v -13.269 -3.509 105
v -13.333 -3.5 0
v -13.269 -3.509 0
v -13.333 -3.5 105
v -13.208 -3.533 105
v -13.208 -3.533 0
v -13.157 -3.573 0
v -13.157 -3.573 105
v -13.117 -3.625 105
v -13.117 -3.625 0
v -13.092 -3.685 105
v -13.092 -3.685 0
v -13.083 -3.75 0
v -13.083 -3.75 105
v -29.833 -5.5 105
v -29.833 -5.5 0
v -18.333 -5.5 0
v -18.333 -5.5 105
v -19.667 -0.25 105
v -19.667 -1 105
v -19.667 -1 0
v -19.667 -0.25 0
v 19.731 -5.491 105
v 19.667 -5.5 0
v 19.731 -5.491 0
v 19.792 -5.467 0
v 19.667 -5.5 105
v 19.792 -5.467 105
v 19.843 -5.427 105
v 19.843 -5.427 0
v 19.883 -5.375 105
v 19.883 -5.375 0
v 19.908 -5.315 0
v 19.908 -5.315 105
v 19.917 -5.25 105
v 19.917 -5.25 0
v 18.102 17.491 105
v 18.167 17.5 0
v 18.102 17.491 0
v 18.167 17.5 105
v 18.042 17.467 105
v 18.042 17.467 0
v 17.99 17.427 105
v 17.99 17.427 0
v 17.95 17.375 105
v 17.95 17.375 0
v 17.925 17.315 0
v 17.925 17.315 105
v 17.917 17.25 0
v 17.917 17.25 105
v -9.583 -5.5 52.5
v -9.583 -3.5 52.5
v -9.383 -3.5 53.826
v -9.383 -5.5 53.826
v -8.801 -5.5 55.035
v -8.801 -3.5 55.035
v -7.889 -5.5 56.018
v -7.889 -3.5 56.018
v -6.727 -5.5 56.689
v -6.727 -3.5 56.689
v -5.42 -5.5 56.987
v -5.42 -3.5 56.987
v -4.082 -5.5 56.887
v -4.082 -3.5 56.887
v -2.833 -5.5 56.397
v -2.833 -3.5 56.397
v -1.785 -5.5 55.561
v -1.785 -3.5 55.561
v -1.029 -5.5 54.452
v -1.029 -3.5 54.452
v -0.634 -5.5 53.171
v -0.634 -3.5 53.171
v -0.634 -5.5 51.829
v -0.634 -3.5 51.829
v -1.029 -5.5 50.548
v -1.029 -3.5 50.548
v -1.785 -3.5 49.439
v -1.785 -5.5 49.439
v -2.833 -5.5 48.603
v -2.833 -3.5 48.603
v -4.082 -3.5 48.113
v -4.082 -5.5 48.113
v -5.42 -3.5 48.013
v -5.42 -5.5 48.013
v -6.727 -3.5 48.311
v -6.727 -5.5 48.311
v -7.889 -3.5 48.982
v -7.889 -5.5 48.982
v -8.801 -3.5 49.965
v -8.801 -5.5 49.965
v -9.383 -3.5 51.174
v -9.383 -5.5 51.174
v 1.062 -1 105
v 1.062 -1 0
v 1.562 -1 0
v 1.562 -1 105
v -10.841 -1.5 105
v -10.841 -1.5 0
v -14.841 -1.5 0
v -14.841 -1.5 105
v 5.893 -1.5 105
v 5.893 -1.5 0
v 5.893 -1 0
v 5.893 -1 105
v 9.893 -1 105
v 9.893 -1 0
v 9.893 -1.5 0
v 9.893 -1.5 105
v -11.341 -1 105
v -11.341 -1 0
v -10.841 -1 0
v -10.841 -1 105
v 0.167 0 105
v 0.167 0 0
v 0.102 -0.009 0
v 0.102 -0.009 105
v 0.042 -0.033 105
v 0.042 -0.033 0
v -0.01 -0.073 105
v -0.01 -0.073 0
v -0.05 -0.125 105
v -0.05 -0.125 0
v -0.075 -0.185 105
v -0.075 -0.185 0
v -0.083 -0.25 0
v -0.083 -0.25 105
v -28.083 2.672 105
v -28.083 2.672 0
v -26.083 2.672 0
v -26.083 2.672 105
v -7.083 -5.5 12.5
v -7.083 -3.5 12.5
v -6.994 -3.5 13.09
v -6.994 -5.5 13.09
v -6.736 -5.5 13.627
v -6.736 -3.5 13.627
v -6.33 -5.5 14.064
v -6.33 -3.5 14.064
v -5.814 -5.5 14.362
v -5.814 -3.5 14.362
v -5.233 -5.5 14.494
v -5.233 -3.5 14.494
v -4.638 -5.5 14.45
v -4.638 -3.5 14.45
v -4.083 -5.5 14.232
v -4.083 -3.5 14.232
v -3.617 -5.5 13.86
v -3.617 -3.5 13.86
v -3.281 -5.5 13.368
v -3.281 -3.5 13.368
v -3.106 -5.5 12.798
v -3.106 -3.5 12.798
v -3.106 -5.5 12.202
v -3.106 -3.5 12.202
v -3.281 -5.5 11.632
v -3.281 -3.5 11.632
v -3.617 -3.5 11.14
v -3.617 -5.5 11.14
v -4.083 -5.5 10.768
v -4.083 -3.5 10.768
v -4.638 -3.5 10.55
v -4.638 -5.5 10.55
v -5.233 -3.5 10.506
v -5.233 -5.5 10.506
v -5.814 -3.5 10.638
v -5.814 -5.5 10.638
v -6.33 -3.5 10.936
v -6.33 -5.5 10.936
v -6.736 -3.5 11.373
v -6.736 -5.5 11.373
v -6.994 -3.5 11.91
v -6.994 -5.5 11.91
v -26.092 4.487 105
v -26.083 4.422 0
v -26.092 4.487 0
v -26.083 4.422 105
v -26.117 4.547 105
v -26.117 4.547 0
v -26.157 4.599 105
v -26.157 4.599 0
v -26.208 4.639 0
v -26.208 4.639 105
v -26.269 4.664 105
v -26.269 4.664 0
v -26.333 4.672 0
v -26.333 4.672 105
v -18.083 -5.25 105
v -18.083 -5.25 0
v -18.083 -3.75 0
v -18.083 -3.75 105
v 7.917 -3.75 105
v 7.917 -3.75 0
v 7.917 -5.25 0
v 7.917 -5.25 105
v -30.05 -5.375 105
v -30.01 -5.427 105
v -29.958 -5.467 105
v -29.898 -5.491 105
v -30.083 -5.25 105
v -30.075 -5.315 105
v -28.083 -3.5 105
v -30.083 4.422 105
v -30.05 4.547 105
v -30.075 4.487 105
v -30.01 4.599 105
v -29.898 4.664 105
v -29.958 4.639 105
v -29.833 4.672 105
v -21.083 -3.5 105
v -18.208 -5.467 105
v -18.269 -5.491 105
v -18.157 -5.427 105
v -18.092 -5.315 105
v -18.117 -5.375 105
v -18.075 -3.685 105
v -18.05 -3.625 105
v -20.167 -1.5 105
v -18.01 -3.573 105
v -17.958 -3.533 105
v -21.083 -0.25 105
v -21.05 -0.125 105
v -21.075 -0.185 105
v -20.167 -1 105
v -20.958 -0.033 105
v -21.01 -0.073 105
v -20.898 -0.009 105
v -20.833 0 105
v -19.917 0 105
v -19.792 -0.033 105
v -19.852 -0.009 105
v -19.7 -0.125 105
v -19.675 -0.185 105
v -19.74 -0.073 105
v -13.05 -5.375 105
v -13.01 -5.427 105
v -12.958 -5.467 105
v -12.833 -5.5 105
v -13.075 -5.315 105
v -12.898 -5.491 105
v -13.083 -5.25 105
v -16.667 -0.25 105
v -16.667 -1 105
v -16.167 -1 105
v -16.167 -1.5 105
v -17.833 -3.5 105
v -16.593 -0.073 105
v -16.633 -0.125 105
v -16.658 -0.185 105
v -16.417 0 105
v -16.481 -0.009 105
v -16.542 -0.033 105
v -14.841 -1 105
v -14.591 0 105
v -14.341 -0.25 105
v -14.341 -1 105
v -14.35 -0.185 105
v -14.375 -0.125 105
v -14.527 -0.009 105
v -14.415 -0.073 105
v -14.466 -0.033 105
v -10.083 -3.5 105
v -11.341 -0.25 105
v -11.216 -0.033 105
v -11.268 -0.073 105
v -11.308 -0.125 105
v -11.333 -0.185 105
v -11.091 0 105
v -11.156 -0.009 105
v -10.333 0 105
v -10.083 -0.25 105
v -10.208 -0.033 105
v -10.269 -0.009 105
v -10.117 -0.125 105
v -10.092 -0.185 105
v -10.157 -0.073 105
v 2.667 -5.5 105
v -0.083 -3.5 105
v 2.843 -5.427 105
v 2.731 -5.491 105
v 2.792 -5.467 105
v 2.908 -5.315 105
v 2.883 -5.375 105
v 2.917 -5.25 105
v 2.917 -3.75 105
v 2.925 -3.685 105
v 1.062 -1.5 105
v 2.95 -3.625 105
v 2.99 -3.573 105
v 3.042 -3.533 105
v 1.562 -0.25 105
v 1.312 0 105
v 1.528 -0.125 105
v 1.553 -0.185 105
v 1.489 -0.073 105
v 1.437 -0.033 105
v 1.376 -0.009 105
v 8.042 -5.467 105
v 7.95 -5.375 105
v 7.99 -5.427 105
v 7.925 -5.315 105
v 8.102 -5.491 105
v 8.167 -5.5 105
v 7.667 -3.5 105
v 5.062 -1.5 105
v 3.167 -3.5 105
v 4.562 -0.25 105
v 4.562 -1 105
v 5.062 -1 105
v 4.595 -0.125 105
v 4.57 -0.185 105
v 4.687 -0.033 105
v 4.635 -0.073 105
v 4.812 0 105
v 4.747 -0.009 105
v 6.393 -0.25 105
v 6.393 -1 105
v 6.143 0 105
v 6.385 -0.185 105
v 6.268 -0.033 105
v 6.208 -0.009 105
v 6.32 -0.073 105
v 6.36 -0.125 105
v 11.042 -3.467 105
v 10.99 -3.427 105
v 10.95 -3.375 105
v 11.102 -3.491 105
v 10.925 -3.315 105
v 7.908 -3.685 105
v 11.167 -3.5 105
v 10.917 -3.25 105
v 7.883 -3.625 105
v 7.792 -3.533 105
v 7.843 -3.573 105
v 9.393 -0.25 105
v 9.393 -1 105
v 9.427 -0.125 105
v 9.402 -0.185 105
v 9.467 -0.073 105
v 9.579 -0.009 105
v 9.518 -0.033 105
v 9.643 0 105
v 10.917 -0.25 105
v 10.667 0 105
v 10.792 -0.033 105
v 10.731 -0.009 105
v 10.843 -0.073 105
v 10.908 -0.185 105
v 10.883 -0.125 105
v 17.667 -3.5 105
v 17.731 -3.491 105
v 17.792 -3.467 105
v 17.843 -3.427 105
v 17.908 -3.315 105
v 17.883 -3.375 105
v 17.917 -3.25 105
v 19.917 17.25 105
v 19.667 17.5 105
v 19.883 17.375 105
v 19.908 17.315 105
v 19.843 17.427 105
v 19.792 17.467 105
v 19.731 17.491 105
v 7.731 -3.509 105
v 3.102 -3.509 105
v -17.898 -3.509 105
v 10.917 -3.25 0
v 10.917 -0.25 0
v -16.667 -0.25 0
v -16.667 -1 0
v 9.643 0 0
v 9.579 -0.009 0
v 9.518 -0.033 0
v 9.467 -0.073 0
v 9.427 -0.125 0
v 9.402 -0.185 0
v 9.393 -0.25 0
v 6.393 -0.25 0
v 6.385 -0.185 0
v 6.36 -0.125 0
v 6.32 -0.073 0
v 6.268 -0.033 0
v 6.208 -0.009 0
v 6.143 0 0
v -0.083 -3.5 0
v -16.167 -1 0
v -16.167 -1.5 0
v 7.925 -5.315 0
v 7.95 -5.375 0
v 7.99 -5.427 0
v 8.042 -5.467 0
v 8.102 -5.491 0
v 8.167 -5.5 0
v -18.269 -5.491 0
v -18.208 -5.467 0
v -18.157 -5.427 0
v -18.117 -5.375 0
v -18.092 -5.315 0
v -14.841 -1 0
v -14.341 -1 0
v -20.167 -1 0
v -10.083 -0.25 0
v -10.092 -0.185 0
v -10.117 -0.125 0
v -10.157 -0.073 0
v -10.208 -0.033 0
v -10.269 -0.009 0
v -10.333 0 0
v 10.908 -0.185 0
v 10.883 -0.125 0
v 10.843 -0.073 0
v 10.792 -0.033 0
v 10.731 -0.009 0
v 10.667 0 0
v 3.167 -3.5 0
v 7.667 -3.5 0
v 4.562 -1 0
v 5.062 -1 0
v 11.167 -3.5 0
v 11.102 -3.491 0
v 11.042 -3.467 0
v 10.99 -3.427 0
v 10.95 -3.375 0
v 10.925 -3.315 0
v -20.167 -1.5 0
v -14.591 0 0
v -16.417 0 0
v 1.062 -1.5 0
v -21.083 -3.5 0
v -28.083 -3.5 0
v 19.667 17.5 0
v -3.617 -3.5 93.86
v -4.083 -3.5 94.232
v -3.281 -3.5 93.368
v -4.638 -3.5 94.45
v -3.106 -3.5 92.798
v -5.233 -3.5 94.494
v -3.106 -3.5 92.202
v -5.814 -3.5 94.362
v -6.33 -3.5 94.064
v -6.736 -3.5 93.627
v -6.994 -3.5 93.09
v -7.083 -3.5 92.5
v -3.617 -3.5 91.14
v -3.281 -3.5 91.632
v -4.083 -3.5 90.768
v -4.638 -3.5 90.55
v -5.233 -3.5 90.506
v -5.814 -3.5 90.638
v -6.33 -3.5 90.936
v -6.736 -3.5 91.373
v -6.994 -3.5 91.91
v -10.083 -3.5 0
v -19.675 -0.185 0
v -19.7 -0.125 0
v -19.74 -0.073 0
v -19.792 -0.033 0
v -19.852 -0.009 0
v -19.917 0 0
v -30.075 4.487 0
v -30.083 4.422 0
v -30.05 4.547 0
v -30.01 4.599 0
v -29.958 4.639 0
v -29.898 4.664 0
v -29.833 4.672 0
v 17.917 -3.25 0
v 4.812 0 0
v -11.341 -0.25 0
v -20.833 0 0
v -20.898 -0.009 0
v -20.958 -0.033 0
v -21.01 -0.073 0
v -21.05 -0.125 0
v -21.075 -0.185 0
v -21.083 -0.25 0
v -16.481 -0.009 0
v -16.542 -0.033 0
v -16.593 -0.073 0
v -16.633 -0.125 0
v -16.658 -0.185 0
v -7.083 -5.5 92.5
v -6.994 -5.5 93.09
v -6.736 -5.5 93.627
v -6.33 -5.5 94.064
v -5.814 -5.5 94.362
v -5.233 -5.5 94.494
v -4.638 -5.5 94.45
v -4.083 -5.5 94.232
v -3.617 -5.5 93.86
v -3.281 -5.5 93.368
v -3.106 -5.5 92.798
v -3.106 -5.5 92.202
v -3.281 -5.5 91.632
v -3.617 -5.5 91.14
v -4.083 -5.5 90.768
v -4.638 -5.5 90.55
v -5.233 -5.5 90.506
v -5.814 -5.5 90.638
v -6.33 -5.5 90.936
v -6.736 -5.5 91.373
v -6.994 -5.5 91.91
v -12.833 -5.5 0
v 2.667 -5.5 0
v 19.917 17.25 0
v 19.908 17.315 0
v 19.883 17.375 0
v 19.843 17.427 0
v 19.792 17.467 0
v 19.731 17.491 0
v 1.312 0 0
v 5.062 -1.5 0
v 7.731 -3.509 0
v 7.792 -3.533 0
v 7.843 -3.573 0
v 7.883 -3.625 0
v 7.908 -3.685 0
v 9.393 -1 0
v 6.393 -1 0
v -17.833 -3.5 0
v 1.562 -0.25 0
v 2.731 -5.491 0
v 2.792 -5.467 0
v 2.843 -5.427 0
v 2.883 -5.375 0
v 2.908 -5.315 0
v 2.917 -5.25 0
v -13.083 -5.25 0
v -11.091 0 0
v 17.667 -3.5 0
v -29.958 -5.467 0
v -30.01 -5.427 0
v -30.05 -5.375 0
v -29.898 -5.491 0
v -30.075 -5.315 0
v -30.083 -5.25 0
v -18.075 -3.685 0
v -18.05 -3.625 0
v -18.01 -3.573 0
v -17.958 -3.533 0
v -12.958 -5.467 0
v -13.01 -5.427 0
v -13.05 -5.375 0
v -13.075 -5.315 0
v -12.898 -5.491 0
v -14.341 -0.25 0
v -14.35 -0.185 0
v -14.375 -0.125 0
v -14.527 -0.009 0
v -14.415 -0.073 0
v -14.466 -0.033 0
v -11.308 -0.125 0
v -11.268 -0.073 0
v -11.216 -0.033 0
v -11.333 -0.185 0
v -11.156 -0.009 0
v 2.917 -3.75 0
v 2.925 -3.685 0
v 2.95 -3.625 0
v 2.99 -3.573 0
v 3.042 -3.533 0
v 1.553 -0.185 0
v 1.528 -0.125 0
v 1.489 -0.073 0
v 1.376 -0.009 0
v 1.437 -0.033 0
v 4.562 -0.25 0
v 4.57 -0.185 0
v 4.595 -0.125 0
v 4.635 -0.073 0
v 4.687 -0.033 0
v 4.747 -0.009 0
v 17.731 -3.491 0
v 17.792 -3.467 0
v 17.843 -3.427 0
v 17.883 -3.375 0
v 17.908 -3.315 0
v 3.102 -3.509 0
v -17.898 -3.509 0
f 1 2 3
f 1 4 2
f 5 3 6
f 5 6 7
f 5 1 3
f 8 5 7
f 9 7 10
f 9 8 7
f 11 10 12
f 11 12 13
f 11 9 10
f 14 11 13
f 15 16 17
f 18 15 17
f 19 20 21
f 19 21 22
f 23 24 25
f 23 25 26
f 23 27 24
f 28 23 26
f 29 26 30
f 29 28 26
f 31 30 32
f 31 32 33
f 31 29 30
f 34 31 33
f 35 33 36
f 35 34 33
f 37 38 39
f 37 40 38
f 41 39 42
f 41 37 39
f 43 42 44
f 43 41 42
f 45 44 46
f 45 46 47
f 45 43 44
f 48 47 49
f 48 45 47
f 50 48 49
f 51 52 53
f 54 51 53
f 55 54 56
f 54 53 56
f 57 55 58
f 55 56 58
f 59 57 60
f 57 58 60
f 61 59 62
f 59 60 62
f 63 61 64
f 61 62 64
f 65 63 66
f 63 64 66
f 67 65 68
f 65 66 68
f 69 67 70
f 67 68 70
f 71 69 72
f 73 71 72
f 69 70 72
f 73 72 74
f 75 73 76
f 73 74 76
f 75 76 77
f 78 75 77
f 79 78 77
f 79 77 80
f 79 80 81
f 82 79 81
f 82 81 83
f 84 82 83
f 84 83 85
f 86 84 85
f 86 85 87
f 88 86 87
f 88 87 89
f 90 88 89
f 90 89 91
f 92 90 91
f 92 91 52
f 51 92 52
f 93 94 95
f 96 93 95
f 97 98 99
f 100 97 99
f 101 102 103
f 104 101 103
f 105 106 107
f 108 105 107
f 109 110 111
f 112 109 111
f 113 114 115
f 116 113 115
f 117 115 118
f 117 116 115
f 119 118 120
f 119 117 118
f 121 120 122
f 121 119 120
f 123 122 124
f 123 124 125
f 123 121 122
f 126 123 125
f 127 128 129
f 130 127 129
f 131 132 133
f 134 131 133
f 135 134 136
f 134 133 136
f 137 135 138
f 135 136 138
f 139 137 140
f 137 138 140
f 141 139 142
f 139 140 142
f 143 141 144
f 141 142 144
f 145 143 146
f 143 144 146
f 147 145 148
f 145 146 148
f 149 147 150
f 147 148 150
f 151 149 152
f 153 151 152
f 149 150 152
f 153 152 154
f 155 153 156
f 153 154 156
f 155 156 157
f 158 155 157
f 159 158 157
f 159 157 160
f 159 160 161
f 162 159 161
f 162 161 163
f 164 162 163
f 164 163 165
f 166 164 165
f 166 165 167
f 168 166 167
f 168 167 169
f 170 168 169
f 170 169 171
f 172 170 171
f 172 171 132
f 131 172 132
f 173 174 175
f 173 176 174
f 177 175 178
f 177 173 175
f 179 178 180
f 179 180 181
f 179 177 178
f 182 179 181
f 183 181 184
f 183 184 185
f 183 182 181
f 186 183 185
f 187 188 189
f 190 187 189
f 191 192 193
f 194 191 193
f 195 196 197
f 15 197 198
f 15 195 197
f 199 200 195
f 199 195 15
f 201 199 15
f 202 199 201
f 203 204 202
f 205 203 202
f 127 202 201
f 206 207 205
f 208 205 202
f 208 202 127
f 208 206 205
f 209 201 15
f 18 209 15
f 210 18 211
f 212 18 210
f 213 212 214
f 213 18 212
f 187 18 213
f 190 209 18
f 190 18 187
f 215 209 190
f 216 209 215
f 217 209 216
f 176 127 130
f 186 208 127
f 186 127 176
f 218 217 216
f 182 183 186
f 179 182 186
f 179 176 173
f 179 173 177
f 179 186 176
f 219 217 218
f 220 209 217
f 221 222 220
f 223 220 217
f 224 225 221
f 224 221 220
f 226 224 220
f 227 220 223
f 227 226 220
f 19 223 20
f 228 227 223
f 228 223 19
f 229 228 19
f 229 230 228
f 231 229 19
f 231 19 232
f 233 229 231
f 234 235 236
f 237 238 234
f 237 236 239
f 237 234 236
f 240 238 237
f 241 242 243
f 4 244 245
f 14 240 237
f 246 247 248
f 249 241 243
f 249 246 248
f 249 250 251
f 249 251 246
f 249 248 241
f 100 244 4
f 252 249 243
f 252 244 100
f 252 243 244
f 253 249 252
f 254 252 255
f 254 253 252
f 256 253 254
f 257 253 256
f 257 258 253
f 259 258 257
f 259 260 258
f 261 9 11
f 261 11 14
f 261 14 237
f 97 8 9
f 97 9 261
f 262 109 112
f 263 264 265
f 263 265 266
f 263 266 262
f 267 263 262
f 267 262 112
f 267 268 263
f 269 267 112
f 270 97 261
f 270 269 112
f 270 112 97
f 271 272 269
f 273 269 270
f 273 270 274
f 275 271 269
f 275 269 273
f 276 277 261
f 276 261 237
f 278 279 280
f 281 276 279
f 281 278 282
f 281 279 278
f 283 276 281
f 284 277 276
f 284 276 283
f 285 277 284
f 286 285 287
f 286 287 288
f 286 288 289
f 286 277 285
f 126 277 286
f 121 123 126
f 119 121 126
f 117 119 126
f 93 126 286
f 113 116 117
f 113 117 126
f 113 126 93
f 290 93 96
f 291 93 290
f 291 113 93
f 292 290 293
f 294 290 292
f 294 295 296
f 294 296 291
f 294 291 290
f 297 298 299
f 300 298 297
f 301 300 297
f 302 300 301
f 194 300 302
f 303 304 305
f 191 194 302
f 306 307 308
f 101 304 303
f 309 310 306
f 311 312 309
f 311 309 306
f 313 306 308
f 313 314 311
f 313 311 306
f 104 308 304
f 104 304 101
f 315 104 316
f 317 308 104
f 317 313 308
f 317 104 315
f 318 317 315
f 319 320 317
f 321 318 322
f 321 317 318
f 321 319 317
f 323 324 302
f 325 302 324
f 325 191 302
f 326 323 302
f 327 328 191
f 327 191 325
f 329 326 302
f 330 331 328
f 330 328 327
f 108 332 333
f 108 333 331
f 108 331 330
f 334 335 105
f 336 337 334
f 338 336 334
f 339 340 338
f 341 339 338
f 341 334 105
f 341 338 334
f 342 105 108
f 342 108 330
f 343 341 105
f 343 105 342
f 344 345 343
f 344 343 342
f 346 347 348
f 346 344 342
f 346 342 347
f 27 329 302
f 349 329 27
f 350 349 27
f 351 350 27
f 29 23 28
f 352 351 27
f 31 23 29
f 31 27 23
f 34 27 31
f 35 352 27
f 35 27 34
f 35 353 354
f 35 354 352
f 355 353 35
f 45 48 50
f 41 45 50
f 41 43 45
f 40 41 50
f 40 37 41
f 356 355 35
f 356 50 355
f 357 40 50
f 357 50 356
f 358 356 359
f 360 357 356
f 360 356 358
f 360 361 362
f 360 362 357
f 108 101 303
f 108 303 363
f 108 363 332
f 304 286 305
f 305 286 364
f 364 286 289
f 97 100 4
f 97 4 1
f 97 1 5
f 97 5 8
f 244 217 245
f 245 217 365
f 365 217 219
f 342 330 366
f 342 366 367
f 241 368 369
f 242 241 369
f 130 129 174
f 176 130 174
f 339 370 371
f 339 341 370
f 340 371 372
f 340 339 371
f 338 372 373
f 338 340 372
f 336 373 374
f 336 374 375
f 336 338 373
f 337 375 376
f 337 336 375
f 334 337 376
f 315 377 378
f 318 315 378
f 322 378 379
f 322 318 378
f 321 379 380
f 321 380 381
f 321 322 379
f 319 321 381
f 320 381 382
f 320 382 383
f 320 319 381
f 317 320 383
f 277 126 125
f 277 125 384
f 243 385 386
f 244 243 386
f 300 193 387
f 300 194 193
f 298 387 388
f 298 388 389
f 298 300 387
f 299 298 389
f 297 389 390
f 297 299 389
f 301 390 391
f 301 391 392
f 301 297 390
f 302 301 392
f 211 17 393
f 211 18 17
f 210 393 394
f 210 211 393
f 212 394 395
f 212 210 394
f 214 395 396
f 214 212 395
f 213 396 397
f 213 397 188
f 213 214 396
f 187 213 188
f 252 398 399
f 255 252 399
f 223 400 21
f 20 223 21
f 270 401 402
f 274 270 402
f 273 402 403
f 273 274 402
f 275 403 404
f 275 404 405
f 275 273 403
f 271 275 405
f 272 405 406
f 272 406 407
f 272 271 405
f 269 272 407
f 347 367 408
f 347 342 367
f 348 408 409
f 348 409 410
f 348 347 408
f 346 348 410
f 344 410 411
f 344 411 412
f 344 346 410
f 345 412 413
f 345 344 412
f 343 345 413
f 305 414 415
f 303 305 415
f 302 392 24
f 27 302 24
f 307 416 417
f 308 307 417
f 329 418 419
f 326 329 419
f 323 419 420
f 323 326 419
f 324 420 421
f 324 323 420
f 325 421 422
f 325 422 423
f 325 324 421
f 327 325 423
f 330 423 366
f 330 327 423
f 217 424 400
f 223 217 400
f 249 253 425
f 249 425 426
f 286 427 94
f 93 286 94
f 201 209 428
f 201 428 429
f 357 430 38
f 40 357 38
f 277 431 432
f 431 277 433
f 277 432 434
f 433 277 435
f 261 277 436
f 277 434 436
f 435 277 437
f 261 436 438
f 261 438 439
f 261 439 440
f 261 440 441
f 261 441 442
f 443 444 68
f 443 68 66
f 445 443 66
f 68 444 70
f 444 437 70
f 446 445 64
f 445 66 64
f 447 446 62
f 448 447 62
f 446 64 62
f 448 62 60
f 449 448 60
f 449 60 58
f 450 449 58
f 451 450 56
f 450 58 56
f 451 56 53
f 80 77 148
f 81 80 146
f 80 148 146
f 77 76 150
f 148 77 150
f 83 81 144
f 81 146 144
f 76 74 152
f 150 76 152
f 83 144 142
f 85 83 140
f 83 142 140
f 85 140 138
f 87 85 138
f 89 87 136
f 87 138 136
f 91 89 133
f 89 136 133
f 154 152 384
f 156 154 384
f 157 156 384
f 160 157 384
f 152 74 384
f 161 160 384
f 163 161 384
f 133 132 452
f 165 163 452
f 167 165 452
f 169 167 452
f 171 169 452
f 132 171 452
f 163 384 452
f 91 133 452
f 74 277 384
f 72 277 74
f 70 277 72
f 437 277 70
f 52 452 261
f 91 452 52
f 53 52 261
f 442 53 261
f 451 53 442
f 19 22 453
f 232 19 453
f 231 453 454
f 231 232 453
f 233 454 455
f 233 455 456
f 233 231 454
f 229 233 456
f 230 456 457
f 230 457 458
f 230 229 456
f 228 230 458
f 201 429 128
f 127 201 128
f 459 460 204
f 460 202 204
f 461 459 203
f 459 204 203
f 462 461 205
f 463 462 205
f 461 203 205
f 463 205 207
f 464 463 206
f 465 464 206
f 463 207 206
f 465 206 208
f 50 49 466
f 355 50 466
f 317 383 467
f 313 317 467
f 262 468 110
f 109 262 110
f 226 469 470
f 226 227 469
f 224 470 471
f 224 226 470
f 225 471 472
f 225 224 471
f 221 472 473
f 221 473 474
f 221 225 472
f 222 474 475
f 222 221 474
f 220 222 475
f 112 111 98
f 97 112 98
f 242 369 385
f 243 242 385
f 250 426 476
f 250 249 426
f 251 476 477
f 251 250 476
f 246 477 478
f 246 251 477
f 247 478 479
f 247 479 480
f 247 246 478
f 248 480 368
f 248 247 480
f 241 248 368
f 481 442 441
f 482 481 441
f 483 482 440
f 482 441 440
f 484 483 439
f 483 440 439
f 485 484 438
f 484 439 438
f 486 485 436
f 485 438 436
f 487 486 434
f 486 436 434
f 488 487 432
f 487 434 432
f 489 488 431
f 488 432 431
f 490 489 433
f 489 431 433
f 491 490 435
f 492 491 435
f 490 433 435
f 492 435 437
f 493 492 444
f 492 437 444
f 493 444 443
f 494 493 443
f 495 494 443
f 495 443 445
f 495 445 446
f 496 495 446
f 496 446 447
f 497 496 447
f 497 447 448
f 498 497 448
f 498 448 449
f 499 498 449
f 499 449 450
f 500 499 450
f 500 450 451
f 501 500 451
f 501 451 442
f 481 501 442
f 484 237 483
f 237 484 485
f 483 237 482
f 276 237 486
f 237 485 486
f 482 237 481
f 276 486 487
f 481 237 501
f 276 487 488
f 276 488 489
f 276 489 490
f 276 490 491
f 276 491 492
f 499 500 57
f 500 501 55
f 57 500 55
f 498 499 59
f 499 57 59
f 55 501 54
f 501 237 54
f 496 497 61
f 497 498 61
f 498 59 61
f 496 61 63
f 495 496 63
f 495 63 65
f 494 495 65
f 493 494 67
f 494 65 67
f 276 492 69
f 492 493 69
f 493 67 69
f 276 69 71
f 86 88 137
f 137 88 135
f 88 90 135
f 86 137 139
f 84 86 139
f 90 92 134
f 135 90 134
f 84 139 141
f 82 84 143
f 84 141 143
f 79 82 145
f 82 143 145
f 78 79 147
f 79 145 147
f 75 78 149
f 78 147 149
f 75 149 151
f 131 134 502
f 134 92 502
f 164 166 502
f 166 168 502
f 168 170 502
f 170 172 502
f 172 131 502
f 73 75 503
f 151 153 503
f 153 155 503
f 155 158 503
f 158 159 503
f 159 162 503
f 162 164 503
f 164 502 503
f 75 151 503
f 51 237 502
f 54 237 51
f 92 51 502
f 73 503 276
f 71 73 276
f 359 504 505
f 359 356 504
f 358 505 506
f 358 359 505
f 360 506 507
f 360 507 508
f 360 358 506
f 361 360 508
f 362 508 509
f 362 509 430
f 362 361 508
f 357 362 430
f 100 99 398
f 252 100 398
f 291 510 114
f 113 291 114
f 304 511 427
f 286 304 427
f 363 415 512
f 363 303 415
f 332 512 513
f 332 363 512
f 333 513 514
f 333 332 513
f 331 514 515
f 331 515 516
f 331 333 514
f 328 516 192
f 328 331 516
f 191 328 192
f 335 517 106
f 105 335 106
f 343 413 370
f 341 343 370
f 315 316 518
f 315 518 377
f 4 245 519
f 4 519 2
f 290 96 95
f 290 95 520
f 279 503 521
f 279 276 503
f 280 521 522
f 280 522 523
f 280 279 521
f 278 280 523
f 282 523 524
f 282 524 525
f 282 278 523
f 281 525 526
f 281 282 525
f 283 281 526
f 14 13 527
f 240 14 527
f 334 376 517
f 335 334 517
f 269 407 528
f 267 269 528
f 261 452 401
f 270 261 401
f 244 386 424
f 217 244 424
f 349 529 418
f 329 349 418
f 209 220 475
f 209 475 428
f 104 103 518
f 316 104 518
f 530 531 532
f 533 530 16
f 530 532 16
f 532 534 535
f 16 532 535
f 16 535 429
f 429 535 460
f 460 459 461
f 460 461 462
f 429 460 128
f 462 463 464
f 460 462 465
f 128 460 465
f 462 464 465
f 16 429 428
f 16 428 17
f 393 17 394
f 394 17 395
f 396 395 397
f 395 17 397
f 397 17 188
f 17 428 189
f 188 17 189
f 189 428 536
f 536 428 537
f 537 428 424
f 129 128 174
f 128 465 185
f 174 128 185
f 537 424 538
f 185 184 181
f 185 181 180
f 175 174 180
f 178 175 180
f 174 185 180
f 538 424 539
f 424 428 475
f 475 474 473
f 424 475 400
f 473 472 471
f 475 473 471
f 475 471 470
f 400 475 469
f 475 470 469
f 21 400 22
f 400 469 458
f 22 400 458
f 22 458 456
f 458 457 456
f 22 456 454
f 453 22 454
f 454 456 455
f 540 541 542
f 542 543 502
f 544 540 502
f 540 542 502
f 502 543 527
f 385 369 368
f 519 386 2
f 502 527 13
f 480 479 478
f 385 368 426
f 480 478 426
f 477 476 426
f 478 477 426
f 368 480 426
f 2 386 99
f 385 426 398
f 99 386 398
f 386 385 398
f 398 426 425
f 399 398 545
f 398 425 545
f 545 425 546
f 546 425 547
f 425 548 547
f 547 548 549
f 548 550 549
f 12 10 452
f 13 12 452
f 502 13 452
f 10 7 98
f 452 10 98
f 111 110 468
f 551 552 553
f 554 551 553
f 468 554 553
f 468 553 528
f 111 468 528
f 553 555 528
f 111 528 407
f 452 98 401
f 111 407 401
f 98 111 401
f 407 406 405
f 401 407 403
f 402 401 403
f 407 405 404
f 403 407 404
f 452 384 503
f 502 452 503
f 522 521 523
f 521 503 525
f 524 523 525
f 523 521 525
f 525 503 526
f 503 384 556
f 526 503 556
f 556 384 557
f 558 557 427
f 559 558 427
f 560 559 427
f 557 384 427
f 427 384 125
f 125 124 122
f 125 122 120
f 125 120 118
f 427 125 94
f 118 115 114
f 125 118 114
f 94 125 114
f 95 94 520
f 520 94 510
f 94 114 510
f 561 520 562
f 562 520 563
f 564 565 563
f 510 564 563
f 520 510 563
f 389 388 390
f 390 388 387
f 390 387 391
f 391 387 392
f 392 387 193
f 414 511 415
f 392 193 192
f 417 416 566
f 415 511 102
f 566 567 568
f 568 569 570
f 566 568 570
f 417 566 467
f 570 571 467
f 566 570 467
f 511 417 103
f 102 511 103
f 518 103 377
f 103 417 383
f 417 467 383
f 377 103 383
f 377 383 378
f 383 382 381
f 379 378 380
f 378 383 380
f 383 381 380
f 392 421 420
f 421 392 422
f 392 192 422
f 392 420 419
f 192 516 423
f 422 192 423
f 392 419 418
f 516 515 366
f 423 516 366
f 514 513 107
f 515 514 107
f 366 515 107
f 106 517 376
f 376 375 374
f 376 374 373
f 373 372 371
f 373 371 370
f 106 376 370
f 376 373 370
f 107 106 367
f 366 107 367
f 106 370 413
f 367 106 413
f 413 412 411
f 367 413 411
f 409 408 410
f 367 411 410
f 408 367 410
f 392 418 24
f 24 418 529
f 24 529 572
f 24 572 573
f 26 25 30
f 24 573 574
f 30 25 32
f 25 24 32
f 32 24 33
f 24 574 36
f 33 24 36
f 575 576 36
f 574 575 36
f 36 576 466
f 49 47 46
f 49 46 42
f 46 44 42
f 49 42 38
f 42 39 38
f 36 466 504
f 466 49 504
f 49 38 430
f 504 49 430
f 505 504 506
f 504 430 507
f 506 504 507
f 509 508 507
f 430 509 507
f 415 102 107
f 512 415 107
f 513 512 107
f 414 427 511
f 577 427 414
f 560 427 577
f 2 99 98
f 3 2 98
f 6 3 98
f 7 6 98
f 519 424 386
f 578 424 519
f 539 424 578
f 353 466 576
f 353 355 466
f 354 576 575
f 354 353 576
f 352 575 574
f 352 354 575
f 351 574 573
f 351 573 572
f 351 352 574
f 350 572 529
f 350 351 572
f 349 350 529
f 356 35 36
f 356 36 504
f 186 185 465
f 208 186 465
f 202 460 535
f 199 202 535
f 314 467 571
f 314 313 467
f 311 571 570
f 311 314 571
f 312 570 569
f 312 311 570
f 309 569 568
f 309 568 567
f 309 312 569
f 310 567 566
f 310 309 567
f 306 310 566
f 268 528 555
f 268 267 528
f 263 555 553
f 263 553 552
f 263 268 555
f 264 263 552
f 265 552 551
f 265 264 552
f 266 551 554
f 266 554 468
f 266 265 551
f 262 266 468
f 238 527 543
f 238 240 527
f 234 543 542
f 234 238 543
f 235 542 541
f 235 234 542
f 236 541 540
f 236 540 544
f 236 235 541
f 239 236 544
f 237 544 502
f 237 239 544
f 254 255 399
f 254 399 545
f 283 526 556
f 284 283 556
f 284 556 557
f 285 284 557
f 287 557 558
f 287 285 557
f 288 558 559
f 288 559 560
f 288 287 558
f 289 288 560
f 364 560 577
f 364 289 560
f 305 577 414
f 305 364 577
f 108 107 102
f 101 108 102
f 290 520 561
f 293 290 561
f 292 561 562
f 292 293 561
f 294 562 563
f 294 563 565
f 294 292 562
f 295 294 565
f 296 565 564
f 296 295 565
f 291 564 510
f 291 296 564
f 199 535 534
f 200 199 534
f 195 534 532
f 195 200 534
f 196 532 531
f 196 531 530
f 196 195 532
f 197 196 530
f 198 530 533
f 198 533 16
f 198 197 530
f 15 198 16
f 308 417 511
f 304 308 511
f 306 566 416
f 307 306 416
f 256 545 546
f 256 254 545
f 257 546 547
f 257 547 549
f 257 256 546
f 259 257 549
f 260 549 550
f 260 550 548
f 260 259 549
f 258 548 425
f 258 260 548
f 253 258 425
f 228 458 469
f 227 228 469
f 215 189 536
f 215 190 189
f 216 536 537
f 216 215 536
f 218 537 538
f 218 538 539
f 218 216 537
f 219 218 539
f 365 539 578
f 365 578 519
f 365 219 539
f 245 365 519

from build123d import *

# Parameters (mm, degrees)
F1_DEPTH = 105
F2_R     = 0.25
F3_R     = 2
F3_R_2   = 4.5
F4_DEPTH = 25


with BuildPart() as f1:
    # F0 (on Top) → F1 (new body)
    with BuildSketch(Plane.XY):
        Polygon((-30.083321, 4.672126), (-30.083321, -5.5), (-18.083321, -5.5), (-18.083321, -3.5), (-13.083321, -3.5), (-13.083321, -5.5), (2.916679, -5.5), (2.916679, -3.5), (7.916679, -3.5), (7.916679, -5.5), (19.916679, -5.5), (19.916679, 17.5), (17.916679, 17.5), (17.916679, -3.5), (10.916679, -3.5), (10.916679, 0), (9.393476, 0), (9.393476, -1), (9.893476, -1), (9.893476, -1.5), (5.893476, -1.5), (5.893476, -1), (6.393476, -1), (6.393476, 0), (4.561732, 0), (4.561732, -1), (5.061732, -1), (5.061732, -1.5), (1.061732, -1.5), (1.061732, -1), (1.561732, -1), (1.561732, 0), (-0.083321, 0), (-0.083321, -3.5), (-10.083321, -3.5), (-10.083321, 0), (-11.341457, 0), (-11.341457, -1), (-10.841457, -1), (-10.841457, -1.5), (-14.841457, -1.5), (-14.841457, -1), (-14.341457, -1), (-14.341457, 0), (-16.666559, 0), (-16.666559, -1), (-16.166559, -1), (-16.166559, -1.5), (-20.166559, -1.5), (-20.166559, -1), (-19.666559, -1), (-19.666559, 0), (-21.083321, 0), (-21.083321, -3.5), (-28.083321, -3.5), (-28.083321, 2.672126), (-26.083321, 2.672126), (-26.083321, 4.672126), align=None)
    extrude(amount=F1_DEPTH)

    # F2
    f2_edges = [f1.edges().sort_by_distance(p)[0] for p in [
        (-21.083321, 0, 52.5),
        (-30.083321, 4.672126, 52.5),
        (-26.083321, 4.672126, 52.5),
        (-19.666559, 0, 52.5),
        (-16.666559, 0, 52.5),
        (-14.341457, 0, 52.5),
        (-11.341457, 0, 52.5),
        (-10.083321, 0, 52.5),
        (-0.083321, 0, 52.5),
        (1.561732, 0, 52.5),
        (4.561732, 0, 52.5),
        (6.393476, 0, 52.5),
        (9.393476, 0, 52.5),
        (10.916679, 0, 52.5),
        (17.916679, 17.5, 52.5),
        (-30.083321, -5.5, 52.5),
        (19.916679, 17.5, 52.5),
        (10.916679, -3.5, 52.5),
        (17.916679, -3.5, 52.5),
        (19.916679, -5.5, 52.5),
        (2.916679, -5.5, 52.5),
        (7.916679, -5.5, 52.5),
        (-13.083321, -5.5, 52.5),
        (-18.083321, -5.5, 52.5),
        (-18.083321, -3.5, 52.5),
        (-13.083321, -3.5, 52.5),
        (2.916679, -3.5, 52.5),
        (7.916679, -3.5, 52.5),
    ]]
    fillet(f2_edges, radius=F2_R)

    # F3 (on face) → F4 (cut)
    with BuildSketch(Plane(origin=(0, -3.5, 0), x_dir=(-1, 0, 0), z_dir=(0, 1, 0))):
        with Locations((5.083321, 92.5)):
            Circle(F3_R)
        with Locations((5.083321, 12.5)):
            Circle(F3_R)
        with Locations((5.083321, 52.5)):
            Circle(F3_R_2)
    extrude(amount=-F4_DEPTH, mode=Mode.SUBTRACT)


solid = f1.part
